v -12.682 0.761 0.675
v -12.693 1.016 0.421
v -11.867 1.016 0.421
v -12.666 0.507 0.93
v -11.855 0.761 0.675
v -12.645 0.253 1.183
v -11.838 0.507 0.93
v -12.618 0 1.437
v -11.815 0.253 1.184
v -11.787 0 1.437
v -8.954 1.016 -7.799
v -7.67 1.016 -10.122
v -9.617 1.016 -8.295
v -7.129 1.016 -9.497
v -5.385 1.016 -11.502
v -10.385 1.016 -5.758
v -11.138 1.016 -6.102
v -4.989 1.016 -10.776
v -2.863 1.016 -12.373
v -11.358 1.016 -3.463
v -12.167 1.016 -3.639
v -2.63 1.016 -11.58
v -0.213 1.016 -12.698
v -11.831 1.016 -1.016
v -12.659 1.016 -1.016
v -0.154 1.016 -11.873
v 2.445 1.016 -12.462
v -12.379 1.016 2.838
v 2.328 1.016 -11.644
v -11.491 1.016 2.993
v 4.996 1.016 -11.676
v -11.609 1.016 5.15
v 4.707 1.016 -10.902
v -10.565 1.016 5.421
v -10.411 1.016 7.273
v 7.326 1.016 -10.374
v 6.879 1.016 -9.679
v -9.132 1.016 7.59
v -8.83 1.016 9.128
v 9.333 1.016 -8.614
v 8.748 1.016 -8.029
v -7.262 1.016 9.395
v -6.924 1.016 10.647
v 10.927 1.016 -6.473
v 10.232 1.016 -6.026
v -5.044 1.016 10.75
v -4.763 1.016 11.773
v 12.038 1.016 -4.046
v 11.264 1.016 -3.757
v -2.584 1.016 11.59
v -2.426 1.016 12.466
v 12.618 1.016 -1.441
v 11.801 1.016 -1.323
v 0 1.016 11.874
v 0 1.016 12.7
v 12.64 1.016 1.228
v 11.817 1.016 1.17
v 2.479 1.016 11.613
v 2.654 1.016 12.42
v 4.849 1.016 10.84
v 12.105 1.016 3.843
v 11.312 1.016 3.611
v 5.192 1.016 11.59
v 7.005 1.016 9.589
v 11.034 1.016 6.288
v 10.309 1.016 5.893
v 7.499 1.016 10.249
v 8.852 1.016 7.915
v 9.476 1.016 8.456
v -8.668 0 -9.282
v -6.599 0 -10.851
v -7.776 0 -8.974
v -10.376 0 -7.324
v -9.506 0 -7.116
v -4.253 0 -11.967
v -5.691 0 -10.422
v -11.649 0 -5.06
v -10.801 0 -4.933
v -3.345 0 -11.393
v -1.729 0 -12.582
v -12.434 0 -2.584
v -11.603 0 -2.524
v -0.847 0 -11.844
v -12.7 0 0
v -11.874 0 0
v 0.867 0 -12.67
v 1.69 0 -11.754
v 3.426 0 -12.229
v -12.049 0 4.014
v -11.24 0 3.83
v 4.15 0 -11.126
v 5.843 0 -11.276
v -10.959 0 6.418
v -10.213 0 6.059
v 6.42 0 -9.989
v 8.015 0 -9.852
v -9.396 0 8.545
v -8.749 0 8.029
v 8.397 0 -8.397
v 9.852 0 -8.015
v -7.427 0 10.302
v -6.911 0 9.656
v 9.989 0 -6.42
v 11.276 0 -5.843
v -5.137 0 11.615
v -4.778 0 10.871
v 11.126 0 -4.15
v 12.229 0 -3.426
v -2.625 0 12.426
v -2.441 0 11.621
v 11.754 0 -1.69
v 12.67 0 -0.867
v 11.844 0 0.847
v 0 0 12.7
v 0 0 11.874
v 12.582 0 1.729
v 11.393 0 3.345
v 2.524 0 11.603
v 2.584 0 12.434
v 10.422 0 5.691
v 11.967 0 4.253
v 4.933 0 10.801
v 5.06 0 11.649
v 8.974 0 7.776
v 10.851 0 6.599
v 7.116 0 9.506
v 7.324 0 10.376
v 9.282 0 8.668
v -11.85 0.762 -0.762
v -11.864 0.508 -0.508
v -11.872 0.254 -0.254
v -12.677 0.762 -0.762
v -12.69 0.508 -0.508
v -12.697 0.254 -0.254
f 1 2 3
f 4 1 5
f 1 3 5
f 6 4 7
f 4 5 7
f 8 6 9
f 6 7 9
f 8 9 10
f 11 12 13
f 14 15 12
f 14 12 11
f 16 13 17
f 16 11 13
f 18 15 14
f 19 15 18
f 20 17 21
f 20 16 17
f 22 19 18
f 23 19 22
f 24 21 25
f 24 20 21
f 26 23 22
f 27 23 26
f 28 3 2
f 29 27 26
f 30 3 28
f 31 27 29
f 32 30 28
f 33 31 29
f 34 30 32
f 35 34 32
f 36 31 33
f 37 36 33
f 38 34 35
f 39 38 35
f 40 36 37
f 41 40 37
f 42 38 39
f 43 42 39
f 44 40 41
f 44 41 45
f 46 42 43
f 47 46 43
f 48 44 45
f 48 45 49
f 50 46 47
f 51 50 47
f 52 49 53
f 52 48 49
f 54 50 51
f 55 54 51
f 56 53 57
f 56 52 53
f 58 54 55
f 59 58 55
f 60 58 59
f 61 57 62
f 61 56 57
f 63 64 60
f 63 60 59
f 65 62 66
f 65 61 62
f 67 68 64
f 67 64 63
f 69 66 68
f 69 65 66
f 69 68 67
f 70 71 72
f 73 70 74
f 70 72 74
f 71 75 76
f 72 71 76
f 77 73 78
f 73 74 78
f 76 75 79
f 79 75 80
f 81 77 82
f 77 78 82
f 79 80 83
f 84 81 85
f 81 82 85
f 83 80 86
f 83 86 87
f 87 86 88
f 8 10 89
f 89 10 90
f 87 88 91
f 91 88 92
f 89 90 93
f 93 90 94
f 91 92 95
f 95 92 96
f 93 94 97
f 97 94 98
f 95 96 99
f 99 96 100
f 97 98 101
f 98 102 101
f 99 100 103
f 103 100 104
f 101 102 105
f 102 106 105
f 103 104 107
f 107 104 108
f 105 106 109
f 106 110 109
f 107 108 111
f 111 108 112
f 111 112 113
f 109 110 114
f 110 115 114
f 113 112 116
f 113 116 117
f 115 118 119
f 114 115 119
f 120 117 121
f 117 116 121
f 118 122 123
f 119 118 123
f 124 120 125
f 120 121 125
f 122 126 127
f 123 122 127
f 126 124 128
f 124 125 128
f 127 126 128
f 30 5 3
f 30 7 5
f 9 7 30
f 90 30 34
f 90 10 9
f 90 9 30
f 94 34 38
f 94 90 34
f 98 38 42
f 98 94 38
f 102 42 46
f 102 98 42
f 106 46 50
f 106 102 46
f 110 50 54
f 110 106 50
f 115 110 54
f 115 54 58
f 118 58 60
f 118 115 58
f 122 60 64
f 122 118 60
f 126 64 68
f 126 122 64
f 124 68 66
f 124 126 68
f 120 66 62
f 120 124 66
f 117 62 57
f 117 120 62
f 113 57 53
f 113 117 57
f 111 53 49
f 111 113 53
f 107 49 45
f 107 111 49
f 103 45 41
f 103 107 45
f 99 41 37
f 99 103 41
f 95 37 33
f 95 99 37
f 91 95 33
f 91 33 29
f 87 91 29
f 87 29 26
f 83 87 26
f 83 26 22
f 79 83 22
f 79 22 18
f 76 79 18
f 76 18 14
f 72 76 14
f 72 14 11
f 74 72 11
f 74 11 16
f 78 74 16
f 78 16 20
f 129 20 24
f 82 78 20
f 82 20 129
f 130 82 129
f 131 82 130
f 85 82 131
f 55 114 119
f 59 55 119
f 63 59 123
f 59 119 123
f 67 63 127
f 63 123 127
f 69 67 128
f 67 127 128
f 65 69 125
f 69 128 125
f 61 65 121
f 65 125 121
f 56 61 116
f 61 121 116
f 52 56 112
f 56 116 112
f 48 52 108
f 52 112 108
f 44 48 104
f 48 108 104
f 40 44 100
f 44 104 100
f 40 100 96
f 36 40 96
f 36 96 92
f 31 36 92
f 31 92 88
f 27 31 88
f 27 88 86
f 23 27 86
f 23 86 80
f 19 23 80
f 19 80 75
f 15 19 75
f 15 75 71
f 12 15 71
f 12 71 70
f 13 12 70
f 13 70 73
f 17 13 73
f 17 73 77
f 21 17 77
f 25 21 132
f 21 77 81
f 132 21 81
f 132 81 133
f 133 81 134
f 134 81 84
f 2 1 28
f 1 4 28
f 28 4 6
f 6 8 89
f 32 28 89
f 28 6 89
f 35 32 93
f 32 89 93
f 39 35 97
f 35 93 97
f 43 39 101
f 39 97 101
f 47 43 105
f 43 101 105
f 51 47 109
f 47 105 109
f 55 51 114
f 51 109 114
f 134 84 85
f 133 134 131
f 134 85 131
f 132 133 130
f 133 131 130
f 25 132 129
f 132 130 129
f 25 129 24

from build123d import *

# Parameters (mm, degrees)
SKETCH1_R               = 12.7
SKETCH1_R_2             = 11.8745
BOSS_EXTRUDE1_DEPTH     = 1.016
CUT_EXTRUDE1_REACH      = 19.989
CUT_EXTRUDE1_END_RADIUS = 12.7


with BuildPart() as part:
    # Sketch1 → Boss-Extrude1 (new body)
    with BuildSketch(Plane(origin=(0, 0, 0), x_dir=(1, 0, 0), z_dir=(0, 1, 0))):
        Circle(SKETCH1_R)
        Circle(SKETCH1_R_2, mode=Mode.SUBTRACT)
    extrude(amount=BOSS_EXTRUDE1_DEPTH)

    # Cut-Extrude1: up to this cylinder (the profile starts inside it)
    cut_extrude1_end = Plane(origin=(0, 0.508, 0), z_dir=(0, -1, 0)) * Cylinder(CUT_EXTRUDE1_END_RADIUS, 66.378, mode=Mode.PRIVATE)
    # Sketch2 → Cut-Extrude1 (cut, up to the surface)
    with BuildSketch(Plane(origin=(0, 0, 0), x_dir=(0, 0, -1), z_dir=(1, 0, 0)), mode=Mode.PRIVATE) as cut_extrude1_sk1:
        Polygon((0, 0), (1.016, 1.016), (-0.420840979, 1.016), (-1.436840979, 0), align=None)
    cut_extrude1_tool1 = extrude(cut_extrude1_sk1.sketch, amount=-CUT_EXTRUDE1_REACH, mode=Mode.PRIVATE) & cut_extrude1_end
    add(cut_extrude1_tool1.solids().sort_by_distance((0, 0.508, 0.21042))[0], mode=Mode.SUBTRACT)


solid = part.part
